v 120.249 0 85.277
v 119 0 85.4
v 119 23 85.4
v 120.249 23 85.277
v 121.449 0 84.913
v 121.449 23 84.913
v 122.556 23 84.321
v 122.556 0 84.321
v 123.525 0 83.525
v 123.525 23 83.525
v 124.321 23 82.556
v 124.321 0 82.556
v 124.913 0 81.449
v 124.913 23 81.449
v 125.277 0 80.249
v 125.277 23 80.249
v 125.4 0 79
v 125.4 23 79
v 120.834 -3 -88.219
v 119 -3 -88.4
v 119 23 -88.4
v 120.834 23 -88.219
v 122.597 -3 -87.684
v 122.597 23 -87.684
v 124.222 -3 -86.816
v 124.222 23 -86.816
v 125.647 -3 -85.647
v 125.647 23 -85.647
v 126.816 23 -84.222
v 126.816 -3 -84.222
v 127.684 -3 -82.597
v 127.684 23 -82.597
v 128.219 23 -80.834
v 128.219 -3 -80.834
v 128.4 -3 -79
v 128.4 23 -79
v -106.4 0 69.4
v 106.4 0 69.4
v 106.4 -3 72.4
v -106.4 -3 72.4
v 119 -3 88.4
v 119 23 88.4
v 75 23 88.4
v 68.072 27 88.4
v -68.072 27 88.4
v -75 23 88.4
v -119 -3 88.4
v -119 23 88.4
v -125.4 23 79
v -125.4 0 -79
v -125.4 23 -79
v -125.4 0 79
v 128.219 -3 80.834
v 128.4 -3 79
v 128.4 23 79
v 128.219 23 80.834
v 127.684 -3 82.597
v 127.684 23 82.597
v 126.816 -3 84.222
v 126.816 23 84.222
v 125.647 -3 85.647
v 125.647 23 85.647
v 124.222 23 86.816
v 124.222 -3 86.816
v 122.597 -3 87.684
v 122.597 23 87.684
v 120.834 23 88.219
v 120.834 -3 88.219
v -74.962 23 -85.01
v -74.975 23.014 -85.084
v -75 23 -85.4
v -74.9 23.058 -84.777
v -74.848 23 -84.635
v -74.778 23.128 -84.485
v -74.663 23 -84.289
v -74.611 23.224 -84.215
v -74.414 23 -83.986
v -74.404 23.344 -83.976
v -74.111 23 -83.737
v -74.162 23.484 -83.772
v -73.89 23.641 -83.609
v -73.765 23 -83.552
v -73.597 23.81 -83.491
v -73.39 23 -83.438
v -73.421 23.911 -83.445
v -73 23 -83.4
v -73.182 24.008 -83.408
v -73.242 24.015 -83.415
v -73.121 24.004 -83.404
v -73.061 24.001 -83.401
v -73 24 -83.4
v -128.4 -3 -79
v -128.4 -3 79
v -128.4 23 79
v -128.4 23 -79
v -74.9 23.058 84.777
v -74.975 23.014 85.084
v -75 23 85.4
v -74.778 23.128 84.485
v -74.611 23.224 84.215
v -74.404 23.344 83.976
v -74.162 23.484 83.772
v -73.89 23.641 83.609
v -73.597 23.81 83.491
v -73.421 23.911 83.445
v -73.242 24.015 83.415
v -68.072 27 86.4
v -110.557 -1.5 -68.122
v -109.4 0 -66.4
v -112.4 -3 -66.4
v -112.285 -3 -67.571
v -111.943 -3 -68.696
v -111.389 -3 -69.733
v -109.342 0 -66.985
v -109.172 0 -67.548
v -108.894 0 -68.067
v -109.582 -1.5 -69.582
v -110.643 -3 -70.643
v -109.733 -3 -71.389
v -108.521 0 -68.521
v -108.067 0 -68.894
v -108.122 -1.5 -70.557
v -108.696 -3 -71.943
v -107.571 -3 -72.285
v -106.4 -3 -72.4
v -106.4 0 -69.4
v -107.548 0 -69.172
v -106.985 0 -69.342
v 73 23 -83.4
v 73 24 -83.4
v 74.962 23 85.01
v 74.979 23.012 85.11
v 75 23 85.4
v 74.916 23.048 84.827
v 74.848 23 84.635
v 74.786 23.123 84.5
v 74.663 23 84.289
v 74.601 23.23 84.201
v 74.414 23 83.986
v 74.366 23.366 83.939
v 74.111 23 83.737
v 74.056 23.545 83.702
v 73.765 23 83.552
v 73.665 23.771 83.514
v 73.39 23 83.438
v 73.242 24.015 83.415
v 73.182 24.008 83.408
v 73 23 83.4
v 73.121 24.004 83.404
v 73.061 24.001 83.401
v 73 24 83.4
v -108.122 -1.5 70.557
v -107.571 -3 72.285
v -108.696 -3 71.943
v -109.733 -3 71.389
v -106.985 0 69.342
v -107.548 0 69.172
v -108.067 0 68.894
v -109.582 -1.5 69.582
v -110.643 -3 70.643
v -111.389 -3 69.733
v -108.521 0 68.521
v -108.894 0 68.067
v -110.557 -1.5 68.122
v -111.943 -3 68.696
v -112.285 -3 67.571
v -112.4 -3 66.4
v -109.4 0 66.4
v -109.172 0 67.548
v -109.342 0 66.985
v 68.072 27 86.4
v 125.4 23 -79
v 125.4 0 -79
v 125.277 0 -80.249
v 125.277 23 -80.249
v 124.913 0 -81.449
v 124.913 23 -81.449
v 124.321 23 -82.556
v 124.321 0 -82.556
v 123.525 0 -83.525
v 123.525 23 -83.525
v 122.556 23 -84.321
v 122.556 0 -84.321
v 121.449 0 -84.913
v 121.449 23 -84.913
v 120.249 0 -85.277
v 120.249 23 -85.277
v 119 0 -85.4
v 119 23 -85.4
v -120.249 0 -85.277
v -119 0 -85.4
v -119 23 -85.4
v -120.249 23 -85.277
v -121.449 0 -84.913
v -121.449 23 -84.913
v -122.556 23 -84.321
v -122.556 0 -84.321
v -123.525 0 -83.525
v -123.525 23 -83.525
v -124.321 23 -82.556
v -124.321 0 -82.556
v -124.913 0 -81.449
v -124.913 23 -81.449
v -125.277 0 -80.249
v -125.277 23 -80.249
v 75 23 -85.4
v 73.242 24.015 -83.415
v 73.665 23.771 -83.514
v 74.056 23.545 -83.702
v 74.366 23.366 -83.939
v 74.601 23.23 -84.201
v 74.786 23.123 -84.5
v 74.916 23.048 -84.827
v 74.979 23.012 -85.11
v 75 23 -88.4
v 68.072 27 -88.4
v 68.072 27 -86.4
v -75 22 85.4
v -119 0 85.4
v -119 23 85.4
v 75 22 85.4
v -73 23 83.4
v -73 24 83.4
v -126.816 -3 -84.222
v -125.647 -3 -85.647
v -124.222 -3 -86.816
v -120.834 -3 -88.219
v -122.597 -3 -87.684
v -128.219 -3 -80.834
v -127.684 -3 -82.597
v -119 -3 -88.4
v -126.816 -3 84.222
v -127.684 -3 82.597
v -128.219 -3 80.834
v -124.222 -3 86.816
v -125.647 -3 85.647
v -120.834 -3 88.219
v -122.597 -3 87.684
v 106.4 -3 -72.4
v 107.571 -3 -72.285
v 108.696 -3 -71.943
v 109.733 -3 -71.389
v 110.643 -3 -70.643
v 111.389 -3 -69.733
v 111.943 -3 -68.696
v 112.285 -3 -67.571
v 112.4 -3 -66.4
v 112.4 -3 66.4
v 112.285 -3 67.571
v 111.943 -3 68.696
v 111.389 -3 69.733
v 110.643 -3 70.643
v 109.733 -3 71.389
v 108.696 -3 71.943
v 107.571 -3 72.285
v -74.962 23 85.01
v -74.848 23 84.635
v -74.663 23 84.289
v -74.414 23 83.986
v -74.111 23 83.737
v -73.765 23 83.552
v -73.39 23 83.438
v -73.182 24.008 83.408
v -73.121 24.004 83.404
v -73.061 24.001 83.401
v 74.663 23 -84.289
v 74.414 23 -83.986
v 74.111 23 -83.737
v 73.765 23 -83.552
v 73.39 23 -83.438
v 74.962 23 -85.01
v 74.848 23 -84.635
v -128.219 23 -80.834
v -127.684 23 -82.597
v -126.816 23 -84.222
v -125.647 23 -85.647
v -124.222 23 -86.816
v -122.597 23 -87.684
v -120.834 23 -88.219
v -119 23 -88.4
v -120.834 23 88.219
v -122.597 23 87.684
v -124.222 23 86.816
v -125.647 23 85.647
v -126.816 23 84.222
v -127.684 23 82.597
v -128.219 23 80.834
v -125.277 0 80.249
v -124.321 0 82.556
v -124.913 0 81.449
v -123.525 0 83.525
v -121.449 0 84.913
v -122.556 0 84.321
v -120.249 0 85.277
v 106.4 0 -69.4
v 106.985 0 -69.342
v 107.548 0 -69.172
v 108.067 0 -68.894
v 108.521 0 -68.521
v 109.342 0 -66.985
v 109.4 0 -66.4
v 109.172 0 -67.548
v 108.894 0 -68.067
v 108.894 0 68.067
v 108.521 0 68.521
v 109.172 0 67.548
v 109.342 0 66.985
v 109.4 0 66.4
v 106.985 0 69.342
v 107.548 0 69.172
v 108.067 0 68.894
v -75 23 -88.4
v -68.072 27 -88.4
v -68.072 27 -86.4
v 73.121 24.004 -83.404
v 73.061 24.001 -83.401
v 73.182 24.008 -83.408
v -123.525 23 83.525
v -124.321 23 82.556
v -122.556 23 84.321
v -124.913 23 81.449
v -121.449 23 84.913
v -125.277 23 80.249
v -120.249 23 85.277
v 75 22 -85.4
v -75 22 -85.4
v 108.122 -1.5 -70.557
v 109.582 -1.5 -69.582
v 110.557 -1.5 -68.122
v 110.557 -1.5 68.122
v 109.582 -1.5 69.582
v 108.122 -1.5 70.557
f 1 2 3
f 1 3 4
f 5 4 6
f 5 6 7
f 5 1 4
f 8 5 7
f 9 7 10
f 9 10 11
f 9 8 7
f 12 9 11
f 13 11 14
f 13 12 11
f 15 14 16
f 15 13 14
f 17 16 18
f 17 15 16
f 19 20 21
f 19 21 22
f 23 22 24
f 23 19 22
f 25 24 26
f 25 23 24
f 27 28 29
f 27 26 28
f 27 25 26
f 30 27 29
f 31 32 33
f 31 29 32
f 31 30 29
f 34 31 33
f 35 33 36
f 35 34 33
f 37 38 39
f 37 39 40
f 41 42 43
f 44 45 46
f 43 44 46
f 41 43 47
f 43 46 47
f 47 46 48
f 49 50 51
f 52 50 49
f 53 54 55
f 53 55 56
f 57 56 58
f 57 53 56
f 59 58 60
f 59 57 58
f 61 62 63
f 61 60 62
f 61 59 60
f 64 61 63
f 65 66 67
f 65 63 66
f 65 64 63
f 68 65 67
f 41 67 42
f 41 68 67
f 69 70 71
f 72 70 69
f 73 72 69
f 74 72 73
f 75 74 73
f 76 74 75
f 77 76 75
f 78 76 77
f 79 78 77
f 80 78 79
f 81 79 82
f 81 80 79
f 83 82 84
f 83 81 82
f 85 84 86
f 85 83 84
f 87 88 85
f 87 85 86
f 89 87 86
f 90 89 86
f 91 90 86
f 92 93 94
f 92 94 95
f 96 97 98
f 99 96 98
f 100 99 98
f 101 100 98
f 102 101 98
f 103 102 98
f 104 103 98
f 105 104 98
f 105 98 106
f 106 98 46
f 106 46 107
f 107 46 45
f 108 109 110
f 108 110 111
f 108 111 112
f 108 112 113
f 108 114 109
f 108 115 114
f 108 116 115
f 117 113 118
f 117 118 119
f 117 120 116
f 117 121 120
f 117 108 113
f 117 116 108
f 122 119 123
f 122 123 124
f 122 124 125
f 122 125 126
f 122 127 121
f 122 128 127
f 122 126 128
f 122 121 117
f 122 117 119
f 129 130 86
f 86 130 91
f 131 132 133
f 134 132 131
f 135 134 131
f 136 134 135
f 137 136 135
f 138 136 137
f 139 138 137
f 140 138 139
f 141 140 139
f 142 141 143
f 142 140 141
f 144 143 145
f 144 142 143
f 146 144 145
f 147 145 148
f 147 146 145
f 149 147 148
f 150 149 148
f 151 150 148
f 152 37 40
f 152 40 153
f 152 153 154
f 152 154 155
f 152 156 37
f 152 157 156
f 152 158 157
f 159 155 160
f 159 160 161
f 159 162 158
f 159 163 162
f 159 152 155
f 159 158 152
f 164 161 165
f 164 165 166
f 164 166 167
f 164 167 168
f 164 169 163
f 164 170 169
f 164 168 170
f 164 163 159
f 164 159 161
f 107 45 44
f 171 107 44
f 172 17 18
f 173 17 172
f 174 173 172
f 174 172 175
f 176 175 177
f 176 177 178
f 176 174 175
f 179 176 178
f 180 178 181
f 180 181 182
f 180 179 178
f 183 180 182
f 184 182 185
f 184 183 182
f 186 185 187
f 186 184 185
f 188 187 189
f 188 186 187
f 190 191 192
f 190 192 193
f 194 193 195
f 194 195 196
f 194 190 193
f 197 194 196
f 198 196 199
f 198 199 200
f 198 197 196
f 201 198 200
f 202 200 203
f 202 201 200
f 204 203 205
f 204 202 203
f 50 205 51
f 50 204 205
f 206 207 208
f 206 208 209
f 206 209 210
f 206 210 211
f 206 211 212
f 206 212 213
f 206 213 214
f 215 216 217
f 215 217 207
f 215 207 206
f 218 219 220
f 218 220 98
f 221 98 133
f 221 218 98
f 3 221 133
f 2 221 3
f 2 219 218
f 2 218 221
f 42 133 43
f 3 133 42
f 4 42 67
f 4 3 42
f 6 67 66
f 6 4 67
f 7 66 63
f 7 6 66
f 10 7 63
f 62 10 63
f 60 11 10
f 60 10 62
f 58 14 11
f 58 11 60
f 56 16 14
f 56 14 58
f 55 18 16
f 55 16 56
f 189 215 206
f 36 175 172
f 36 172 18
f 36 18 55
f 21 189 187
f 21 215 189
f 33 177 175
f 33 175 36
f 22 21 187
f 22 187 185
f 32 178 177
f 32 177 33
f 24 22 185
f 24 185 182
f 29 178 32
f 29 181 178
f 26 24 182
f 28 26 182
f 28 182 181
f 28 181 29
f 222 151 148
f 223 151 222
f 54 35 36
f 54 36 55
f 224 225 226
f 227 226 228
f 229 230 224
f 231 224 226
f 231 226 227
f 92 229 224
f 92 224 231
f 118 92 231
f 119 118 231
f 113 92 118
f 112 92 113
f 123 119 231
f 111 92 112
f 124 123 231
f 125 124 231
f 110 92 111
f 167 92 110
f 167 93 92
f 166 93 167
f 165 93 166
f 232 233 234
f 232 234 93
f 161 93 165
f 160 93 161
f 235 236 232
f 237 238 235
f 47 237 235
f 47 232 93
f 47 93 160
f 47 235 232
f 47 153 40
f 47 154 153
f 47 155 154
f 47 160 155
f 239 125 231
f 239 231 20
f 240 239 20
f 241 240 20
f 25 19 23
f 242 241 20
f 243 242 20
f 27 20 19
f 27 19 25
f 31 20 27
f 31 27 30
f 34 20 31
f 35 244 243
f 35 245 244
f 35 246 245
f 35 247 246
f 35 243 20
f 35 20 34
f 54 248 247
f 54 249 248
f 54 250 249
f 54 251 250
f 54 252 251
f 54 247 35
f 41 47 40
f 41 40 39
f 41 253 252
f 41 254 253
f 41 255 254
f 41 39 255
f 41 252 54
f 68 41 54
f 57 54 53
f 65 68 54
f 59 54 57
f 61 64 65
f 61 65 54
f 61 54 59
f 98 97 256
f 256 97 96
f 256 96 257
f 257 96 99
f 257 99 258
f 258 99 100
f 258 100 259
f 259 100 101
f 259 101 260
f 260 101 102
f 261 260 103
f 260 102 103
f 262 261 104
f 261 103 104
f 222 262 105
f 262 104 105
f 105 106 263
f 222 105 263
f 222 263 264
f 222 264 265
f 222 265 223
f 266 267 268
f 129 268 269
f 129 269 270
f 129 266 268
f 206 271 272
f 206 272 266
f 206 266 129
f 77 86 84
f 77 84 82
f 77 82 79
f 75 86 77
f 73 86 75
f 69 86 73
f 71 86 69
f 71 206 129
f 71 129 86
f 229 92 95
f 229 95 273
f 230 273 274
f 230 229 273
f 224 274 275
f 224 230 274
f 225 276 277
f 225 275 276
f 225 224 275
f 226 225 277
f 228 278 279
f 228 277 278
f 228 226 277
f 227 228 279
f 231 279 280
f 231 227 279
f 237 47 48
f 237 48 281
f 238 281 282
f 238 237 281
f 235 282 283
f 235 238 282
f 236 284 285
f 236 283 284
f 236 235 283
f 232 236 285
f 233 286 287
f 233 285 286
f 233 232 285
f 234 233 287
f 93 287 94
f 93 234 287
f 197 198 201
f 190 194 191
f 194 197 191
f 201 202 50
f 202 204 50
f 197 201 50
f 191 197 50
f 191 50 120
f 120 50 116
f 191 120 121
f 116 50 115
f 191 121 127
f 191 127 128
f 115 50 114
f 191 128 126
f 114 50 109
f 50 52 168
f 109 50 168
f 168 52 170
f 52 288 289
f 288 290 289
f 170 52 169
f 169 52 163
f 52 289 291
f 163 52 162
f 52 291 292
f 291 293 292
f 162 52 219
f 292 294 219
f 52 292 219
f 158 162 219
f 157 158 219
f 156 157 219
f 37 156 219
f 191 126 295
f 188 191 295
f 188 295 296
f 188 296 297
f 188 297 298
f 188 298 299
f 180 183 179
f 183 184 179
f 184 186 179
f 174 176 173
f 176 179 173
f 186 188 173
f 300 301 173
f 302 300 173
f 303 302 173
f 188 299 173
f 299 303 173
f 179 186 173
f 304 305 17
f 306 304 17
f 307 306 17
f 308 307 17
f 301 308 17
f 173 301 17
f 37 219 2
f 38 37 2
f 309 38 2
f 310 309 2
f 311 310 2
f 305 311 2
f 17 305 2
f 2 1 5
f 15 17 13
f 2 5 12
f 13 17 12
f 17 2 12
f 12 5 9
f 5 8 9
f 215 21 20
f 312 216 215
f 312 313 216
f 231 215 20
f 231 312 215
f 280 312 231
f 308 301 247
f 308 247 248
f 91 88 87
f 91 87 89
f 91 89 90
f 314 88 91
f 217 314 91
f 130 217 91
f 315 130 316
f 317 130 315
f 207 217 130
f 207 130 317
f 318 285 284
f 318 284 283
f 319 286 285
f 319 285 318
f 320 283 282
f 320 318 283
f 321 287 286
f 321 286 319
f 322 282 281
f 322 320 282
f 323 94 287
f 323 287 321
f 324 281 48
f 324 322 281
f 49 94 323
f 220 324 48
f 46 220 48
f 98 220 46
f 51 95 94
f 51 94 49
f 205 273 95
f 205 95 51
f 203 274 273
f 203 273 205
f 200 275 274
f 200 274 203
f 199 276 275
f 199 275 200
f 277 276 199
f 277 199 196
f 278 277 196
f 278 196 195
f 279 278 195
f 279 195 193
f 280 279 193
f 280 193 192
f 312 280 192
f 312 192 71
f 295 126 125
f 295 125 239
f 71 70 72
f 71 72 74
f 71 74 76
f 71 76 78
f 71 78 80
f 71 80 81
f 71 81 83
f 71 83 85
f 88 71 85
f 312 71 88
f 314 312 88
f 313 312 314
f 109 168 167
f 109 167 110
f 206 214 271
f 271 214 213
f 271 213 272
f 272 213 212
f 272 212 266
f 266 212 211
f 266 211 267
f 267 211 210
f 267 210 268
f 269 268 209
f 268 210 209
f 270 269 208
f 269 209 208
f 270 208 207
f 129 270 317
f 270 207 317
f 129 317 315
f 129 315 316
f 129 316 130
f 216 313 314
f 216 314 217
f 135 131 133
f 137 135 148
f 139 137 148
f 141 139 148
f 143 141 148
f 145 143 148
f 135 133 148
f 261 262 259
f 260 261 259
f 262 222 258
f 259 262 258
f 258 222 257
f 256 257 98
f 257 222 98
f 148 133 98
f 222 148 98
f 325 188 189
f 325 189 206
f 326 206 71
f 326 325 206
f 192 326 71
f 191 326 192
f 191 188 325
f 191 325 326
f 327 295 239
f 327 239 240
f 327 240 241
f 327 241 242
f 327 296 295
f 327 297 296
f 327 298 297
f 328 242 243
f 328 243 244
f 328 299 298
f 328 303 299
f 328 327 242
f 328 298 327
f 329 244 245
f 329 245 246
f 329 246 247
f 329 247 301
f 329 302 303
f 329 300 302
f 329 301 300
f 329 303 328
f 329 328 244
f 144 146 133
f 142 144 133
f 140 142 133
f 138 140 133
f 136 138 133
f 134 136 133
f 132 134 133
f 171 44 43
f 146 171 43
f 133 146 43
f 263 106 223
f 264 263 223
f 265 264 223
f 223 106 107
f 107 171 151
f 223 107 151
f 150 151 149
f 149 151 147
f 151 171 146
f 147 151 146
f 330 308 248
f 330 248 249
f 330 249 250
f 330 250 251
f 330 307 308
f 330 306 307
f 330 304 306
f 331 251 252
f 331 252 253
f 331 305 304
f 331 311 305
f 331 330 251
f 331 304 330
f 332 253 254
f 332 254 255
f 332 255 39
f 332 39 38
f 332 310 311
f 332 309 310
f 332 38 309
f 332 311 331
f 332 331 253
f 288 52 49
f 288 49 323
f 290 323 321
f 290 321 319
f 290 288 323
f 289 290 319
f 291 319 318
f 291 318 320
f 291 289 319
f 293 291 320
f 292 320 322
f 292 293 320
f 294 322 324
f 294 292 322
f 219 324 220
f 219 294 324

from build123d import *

# Parameters (mm, degrees)
BOSS_EXTRUDE1_DEPTH = 23
BOSS_EXTRUDE2_START = 3
SKETCH2_W           = 218.8
SKETCH2_H           = 138.8
BOSS_EXTRUDE2_DEPTH = 3
FILLET1_R           = 3
CHAMFER1_SIZE       = 3
BOSS_EXTRUDE4_DEPTH = 5
CHAMFER2_SIZE       = 3
CUT_EXTRUDE1_DEPTH  = 5


# Read off the part's stored shape, not the designer's step: Mirror1
with BuildPart() as part:
    # Sketch1 → Boss-Extrude1 (new body)
    with BuildSketch(Plane(origin=(0, 0, 0), x_dir=(1, 0, 0), z_dir=(0, 1, 0))):
        with BuildLine():
            Line((119, 88.4), (-119, 88.4))
            ThreePointArc((-119, 88.4), (-125.646803743, 85.646803743), (-128.4, 79))
            Line((-128.4, 79), (-128.4, -79))
            ThreePointArc((-128.4, -79), (-125.646803743, -85.646803743), (-119, -88.4))
            Line((-119, -88.4), (119, -88.4))
            ThreePointArc((119, -88.4), (125.646803743, -85.646803743), (128.4, -79))
            Line((128.4, -79), (128.4, 79))
            ThreePointArc((128.4, 79), (125.646803743, 85.646803743), (119, 88.4))
        make_face()
        with BuildLine():
            Line((-125.4, 79), (-125.4, -79))
            ThreePointArc((-125.4, -79), (-123.5254834, -83.5254834), (-119, -85.4))
            Line((-119, -85.4), (119, -85.4))
            ThreePointArc((119, -85.4), (123.5254834, -83.5254834), (125.4, -79))
            Line((125.4, -79), (125.4, 79))
            ThreePointArc((125.4, 79), (123.5254834, 83.5254834), (119, 85.4))
            Line((119, 85.4), (-119, 85.4))
            ThreePointArc((-119, 85.4), (-123.5254834, 83.5254834), (-125.4, 79))
        make_face(mode=Mode.SUBTRACT)
    extrude(amount=BOSS_EXTRUDE1_DEPTH)

    # Sketch2 → Boss-Extrude2 (add)
    with BuildSketch(Plane.XZ.offset(BOSS_EXTRUDE2_START)):
        with BuildLine():
            Line((128.4, -79), (128.4, 79))
            ThreePointArc((128.4, 79), (125.646803743, 85.646803743), (119, 88.4))
            Line((119, 88.4), (-119, 88.4))
            ThreePointArc((-119, 88.4), (-125.646803743, 85.646803743), (-128.4, 79))
            Line((-128.4, 79), (-128.4, -79))
            ThreePointArc((-128.4, -79), (-125.646803743, -85.646803743), (-119, -88.4))
            Line((-119, -88.4), (119, -88.4))
            ThreePointArc((119, -88.4), (125.646803743, -85.646803743), (128.4, -79))
        make_face()
        Rectangle(SKETCH2_W, SKETCH2_H, mode=Mode.SUBTRACT)
    extrude(amount=-BOSS_EXTRUDE2_DEPTH)

    # Fillet1
    fillet1_edges = [part.edges().sort_by_distance(p)[0] for p in [
        (109.4, -1.5, 69.4),
        (-109.4, -1.5, 69.4),
        (-109.4, -1.5, -69.4),
        (109.4, -1.5, -69.4),
    ]]
    fillet(fillet1_edges, radius=FILLET1_R)

    # Chamfer1
    chamfer1_edges = [part.edges().sort_by_distance(p)[0] for p in [
        (109.4, -3, 0),
        (108.521320344, -3, 68.521320344),
        (108.521320344, -3, -68.521320344),
        (0, -3, 69.4),
        (0, -3, -69.4),
        (-108.521320344, -3, 68.521320344),
        (-108.521320344, -3, -68.521320344),
        (-109.4, -3, 0),
    ]]
    chamfer(chamfer1_edges, length=CHAMFER1_SIZE - 0.0001)  # a hair under: the kernel refuses the full size

    # Sketch4 → Boss-Extrude4 (add)
    with BuildSketch(Plane.XY.offset(88.4)):
        Polygon((75, 23), (-75, 23), (-68.07179677, 27), (68.07179677, 27), align=None)
    extrude(amount=-BOSS_EXTRUDE4_DEPTH)

    # Chamfer2
    chamfer2_edges = [part.edges().sort_by_distance(p)[0] for p in [
        (0, 27, 83.4),
    ]]
    chamfer(chamfer2_edges, length=CHAMFER2_SIZE)

    # Sketch5 → Cut-Extrude1 (cut)
    with BuildSketch(Plane(origin=(0, 27, 0), x_dir=(1, 0, 0), z_dir=(0, 1, 0))):
        with BuildLine():
            Line((-73, -83.4), (-75, -83.4))
            Line((-75, -83.4), (-75, -85.4))
            ThreePointArc((-75, -85.4), (-74.414213562, -83.985786438), (-73, -83.4))
        make_face()
        with BuildLine():
            Line((75, -83.4), (75, -85.4))
            ThreePointArc((75, -85.4), (74.414213562, -83.985786438), (73, -83.4))
            Line((73, -83.4), (75, -83.4))
        make_face()
    extrude(amount=-CUT_EXTRUDE1_DEPTH, mode=Mode.SUBTRACT)

    # Mirror1: part across plane


with BuildPart() as part_1:
    add(part.part)
    add(part.part.mirror(Plane.XY))


solid = part_1.part
